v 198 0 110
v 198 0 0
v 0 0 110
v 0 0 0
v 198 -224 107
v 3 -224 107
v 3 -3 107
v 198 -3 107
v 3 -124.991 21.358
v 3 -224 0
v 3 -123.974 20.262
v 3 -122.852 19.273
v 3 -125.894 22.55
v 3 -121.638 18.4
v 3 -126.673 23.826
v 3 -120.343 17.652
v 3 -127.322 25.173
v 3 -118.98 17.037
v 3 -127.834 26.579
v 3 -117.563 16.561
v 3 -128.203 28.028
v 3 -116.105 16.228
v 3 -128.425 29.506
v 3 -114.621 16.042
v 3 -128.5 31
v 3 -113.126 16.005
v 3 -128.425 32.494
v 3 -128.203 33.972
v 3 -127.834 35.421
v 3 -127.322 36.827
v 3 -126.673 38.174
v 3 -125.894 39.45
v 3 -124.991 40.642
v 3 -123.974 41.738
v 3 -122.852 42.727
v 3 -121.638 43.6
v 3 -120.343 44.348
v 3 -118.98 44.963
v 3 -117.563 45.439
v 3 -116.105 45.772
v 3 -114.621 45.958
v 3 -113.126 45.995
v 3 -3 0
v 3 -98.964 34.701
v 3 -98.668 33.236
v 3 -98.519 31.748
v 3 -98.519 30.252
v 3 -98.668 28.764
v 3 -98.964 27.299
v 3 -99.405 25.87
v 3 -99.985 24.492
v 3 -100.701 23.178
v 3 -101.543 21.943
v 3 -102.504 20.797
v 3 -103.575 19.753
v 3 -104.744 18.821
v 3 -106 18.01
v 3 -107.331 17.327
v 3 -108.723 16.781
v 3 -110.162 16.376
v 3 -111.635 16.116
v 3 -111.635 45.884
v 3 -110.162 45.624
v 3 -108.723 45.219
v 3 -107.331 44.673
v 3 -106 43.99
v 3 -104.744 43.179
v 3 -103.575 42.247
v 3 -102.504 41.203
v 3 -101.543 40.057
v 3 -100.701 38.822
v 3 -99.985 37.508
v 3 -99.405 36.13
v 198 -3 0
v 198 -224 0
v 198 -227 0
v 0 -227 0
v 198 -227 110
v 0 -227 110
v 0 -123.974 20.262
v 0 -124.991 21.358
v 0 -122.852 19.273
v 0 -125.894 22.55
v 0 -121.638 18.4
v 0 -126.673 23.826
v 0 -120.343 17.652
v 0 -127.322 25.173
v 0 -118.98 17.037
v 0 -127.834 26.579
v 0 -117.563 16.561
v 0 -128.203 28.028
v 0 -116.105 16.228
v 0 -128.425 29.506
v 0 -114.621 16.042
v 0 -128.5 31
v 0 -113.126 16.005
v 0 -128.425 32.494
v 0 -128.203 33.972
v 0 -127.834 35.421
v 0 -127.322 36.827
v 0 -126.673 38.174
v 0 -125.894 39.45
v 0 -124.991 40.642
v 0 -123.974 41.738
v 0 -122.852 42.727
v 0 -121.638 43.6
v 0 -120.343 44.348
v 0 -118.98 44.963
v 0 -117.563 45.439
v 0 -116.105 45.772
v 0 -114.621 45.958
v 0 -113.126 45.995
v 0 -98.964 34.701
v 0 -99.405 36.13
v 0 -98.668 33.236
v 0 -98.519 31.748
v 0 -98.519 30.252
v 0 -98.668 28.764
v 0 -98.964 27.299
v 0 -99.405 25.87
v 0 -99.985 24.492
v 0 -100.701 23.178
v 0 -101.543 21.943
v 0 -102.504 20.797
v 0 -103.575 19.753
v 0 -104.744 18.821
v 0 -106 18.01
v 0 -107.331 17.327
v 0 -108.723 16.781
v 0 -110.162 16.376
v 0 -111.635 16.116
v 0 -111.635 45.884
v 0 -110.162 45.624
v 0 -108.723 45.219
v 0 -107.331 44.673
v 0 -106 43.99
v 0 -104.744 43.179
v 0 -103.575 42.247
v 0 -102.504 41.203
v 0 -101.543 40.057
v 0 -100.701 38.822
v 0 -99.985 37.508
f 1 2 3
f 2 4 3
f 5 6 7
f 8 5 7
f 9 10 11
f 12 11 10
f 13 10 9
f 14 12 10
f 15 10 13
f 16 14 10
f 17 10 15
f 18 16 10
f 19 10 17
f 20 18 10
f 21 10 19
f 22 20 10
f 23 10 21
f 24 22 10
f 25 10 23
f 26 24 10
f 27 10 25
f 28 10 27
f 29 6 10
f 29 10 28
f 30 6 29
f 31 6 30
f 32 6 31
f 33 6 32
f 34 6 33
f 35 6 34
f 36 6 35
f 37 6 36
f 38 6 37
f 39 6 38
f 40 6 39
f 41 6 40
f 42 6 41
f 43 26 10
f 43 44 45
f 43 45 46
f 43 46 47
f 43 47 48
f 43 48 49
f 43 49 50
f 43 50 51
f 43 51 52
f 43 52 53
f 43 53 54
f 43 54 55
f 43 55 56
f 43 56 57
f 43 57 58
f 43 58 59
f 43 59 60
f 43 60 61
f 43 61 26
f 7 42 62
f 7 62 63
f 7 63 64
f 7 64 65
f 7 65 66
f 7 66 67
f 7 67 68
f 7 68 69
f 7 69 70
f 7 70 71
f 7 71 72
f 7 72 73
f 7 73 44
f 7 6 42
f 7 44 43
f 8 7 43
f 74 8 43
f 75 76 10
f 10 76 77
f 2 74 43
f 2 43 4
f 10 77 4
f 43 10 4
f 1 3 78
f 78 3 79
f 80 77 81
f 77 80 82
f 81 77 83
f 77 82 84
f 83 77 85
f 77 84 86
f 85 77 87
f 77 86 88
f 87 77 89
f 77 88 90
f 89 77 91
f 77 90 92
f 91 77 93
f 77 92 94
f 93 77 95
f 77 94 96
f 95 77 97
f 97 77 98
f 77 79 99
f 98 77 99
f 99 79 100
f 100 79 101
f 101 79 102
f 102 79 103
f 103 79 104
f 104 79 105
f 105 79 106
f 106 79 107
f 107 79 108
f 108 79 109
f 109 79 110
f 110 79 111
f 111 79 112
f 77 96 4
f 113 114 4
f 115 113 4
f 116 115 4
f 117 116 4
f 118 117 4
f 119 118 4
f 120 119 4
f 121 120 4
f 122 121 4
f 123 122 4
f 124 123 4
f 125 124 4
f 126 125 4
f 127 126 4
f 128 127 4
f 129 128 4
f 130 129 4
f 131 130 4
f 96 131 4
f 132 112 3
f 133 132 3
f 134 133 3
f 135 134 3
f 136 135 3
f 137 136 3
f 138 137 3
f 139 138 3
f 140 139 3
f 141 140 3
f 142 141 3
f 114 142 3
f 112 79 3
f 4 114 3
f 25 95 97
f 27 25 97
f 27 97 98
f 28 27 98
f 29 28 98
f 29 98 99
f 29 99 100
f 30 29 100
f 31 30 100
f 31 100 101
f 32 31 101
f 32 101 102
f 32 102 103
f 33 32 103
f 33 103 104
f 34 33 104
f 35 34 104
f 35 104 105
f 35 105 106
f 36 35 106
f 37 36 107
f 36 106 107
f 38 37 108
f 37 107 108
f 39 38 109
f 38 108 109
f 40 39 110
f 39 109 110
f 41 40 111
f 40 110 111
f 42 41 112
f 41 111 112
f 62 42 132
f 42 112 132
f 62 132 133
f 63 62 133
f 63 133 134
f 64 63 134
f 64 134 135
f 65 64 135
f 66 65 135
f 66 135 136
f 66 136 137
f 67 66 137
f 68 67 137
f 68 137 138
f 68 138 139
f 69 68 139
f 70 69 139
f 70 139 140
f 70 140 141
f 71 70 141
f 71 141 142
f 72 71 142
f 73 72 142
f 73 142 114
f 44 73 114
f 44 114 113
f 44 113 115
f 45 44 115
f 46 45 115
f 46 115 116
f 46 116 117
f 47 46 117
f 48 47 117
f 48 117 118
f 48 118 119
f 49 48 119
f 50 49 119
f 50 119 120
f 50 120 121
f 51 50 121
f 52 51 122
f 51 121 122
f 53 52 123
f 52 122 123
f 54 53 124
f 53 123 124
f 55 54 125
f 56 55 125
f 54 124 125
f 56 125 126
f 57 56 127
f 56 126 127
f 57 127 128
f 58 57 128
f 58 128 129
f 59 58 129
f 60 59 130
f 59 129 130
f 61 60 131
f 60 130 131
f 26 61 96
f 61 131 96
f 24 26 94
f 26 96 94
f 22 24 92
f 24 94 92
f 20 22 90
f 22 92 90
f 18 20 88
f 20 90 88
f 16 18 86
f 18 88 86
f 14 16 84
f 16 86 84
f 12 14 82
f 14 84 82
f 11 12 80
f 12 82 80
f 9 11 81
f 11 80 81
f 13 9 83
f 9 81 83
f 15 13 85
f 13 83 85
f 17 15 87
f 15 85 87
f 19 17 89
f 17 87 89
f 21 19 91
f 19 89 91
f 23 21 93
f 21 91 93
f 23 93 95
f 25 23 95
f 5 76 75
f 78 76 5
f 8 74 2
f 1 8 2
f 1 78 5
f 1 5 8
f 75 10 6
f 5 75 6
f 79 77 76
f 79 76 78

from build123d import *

# Parameters (mm, degrees)
F0_W     = 227
F0_H     = 110
F1_DEPTH = 3
F3_DEPTH = 195
F4_R     = 15
F5_DEPTH = 25


with BuildPart() as f1:
    # F0 (on Right) → F1 (new body)
    with BuildSketch(Plane.YZ):
        with Locations((-113.5, 55)):
            Rectangle(F0_W, F0_H)
    extrude(amount=F1_DEPTH)

    # F2 (on face) → F3 (join)
    with BuildSketch(Plane.YZ.offset(3)):
        Polygon((-3, 0), (0, 0), (0, 110), (-227, 110), (-227, 0), (-224, 0), (-224, 107), (-3, 107), align=None)
    extrude(amount=F3_DEPTH)

    # F4 (on face) → F5 (cut)
    with BuildSketch(Plane(origin=(0, 0, 0), x_dir=(0, -1, 0), z_dir=(-1, 0, 0))):
        with Locations((113.5, 31)):
            Circle(F4_R)
    extrude(amount=-F5_DEPTH, mode=Mode.SUBTRACT)


solid = f1.part
